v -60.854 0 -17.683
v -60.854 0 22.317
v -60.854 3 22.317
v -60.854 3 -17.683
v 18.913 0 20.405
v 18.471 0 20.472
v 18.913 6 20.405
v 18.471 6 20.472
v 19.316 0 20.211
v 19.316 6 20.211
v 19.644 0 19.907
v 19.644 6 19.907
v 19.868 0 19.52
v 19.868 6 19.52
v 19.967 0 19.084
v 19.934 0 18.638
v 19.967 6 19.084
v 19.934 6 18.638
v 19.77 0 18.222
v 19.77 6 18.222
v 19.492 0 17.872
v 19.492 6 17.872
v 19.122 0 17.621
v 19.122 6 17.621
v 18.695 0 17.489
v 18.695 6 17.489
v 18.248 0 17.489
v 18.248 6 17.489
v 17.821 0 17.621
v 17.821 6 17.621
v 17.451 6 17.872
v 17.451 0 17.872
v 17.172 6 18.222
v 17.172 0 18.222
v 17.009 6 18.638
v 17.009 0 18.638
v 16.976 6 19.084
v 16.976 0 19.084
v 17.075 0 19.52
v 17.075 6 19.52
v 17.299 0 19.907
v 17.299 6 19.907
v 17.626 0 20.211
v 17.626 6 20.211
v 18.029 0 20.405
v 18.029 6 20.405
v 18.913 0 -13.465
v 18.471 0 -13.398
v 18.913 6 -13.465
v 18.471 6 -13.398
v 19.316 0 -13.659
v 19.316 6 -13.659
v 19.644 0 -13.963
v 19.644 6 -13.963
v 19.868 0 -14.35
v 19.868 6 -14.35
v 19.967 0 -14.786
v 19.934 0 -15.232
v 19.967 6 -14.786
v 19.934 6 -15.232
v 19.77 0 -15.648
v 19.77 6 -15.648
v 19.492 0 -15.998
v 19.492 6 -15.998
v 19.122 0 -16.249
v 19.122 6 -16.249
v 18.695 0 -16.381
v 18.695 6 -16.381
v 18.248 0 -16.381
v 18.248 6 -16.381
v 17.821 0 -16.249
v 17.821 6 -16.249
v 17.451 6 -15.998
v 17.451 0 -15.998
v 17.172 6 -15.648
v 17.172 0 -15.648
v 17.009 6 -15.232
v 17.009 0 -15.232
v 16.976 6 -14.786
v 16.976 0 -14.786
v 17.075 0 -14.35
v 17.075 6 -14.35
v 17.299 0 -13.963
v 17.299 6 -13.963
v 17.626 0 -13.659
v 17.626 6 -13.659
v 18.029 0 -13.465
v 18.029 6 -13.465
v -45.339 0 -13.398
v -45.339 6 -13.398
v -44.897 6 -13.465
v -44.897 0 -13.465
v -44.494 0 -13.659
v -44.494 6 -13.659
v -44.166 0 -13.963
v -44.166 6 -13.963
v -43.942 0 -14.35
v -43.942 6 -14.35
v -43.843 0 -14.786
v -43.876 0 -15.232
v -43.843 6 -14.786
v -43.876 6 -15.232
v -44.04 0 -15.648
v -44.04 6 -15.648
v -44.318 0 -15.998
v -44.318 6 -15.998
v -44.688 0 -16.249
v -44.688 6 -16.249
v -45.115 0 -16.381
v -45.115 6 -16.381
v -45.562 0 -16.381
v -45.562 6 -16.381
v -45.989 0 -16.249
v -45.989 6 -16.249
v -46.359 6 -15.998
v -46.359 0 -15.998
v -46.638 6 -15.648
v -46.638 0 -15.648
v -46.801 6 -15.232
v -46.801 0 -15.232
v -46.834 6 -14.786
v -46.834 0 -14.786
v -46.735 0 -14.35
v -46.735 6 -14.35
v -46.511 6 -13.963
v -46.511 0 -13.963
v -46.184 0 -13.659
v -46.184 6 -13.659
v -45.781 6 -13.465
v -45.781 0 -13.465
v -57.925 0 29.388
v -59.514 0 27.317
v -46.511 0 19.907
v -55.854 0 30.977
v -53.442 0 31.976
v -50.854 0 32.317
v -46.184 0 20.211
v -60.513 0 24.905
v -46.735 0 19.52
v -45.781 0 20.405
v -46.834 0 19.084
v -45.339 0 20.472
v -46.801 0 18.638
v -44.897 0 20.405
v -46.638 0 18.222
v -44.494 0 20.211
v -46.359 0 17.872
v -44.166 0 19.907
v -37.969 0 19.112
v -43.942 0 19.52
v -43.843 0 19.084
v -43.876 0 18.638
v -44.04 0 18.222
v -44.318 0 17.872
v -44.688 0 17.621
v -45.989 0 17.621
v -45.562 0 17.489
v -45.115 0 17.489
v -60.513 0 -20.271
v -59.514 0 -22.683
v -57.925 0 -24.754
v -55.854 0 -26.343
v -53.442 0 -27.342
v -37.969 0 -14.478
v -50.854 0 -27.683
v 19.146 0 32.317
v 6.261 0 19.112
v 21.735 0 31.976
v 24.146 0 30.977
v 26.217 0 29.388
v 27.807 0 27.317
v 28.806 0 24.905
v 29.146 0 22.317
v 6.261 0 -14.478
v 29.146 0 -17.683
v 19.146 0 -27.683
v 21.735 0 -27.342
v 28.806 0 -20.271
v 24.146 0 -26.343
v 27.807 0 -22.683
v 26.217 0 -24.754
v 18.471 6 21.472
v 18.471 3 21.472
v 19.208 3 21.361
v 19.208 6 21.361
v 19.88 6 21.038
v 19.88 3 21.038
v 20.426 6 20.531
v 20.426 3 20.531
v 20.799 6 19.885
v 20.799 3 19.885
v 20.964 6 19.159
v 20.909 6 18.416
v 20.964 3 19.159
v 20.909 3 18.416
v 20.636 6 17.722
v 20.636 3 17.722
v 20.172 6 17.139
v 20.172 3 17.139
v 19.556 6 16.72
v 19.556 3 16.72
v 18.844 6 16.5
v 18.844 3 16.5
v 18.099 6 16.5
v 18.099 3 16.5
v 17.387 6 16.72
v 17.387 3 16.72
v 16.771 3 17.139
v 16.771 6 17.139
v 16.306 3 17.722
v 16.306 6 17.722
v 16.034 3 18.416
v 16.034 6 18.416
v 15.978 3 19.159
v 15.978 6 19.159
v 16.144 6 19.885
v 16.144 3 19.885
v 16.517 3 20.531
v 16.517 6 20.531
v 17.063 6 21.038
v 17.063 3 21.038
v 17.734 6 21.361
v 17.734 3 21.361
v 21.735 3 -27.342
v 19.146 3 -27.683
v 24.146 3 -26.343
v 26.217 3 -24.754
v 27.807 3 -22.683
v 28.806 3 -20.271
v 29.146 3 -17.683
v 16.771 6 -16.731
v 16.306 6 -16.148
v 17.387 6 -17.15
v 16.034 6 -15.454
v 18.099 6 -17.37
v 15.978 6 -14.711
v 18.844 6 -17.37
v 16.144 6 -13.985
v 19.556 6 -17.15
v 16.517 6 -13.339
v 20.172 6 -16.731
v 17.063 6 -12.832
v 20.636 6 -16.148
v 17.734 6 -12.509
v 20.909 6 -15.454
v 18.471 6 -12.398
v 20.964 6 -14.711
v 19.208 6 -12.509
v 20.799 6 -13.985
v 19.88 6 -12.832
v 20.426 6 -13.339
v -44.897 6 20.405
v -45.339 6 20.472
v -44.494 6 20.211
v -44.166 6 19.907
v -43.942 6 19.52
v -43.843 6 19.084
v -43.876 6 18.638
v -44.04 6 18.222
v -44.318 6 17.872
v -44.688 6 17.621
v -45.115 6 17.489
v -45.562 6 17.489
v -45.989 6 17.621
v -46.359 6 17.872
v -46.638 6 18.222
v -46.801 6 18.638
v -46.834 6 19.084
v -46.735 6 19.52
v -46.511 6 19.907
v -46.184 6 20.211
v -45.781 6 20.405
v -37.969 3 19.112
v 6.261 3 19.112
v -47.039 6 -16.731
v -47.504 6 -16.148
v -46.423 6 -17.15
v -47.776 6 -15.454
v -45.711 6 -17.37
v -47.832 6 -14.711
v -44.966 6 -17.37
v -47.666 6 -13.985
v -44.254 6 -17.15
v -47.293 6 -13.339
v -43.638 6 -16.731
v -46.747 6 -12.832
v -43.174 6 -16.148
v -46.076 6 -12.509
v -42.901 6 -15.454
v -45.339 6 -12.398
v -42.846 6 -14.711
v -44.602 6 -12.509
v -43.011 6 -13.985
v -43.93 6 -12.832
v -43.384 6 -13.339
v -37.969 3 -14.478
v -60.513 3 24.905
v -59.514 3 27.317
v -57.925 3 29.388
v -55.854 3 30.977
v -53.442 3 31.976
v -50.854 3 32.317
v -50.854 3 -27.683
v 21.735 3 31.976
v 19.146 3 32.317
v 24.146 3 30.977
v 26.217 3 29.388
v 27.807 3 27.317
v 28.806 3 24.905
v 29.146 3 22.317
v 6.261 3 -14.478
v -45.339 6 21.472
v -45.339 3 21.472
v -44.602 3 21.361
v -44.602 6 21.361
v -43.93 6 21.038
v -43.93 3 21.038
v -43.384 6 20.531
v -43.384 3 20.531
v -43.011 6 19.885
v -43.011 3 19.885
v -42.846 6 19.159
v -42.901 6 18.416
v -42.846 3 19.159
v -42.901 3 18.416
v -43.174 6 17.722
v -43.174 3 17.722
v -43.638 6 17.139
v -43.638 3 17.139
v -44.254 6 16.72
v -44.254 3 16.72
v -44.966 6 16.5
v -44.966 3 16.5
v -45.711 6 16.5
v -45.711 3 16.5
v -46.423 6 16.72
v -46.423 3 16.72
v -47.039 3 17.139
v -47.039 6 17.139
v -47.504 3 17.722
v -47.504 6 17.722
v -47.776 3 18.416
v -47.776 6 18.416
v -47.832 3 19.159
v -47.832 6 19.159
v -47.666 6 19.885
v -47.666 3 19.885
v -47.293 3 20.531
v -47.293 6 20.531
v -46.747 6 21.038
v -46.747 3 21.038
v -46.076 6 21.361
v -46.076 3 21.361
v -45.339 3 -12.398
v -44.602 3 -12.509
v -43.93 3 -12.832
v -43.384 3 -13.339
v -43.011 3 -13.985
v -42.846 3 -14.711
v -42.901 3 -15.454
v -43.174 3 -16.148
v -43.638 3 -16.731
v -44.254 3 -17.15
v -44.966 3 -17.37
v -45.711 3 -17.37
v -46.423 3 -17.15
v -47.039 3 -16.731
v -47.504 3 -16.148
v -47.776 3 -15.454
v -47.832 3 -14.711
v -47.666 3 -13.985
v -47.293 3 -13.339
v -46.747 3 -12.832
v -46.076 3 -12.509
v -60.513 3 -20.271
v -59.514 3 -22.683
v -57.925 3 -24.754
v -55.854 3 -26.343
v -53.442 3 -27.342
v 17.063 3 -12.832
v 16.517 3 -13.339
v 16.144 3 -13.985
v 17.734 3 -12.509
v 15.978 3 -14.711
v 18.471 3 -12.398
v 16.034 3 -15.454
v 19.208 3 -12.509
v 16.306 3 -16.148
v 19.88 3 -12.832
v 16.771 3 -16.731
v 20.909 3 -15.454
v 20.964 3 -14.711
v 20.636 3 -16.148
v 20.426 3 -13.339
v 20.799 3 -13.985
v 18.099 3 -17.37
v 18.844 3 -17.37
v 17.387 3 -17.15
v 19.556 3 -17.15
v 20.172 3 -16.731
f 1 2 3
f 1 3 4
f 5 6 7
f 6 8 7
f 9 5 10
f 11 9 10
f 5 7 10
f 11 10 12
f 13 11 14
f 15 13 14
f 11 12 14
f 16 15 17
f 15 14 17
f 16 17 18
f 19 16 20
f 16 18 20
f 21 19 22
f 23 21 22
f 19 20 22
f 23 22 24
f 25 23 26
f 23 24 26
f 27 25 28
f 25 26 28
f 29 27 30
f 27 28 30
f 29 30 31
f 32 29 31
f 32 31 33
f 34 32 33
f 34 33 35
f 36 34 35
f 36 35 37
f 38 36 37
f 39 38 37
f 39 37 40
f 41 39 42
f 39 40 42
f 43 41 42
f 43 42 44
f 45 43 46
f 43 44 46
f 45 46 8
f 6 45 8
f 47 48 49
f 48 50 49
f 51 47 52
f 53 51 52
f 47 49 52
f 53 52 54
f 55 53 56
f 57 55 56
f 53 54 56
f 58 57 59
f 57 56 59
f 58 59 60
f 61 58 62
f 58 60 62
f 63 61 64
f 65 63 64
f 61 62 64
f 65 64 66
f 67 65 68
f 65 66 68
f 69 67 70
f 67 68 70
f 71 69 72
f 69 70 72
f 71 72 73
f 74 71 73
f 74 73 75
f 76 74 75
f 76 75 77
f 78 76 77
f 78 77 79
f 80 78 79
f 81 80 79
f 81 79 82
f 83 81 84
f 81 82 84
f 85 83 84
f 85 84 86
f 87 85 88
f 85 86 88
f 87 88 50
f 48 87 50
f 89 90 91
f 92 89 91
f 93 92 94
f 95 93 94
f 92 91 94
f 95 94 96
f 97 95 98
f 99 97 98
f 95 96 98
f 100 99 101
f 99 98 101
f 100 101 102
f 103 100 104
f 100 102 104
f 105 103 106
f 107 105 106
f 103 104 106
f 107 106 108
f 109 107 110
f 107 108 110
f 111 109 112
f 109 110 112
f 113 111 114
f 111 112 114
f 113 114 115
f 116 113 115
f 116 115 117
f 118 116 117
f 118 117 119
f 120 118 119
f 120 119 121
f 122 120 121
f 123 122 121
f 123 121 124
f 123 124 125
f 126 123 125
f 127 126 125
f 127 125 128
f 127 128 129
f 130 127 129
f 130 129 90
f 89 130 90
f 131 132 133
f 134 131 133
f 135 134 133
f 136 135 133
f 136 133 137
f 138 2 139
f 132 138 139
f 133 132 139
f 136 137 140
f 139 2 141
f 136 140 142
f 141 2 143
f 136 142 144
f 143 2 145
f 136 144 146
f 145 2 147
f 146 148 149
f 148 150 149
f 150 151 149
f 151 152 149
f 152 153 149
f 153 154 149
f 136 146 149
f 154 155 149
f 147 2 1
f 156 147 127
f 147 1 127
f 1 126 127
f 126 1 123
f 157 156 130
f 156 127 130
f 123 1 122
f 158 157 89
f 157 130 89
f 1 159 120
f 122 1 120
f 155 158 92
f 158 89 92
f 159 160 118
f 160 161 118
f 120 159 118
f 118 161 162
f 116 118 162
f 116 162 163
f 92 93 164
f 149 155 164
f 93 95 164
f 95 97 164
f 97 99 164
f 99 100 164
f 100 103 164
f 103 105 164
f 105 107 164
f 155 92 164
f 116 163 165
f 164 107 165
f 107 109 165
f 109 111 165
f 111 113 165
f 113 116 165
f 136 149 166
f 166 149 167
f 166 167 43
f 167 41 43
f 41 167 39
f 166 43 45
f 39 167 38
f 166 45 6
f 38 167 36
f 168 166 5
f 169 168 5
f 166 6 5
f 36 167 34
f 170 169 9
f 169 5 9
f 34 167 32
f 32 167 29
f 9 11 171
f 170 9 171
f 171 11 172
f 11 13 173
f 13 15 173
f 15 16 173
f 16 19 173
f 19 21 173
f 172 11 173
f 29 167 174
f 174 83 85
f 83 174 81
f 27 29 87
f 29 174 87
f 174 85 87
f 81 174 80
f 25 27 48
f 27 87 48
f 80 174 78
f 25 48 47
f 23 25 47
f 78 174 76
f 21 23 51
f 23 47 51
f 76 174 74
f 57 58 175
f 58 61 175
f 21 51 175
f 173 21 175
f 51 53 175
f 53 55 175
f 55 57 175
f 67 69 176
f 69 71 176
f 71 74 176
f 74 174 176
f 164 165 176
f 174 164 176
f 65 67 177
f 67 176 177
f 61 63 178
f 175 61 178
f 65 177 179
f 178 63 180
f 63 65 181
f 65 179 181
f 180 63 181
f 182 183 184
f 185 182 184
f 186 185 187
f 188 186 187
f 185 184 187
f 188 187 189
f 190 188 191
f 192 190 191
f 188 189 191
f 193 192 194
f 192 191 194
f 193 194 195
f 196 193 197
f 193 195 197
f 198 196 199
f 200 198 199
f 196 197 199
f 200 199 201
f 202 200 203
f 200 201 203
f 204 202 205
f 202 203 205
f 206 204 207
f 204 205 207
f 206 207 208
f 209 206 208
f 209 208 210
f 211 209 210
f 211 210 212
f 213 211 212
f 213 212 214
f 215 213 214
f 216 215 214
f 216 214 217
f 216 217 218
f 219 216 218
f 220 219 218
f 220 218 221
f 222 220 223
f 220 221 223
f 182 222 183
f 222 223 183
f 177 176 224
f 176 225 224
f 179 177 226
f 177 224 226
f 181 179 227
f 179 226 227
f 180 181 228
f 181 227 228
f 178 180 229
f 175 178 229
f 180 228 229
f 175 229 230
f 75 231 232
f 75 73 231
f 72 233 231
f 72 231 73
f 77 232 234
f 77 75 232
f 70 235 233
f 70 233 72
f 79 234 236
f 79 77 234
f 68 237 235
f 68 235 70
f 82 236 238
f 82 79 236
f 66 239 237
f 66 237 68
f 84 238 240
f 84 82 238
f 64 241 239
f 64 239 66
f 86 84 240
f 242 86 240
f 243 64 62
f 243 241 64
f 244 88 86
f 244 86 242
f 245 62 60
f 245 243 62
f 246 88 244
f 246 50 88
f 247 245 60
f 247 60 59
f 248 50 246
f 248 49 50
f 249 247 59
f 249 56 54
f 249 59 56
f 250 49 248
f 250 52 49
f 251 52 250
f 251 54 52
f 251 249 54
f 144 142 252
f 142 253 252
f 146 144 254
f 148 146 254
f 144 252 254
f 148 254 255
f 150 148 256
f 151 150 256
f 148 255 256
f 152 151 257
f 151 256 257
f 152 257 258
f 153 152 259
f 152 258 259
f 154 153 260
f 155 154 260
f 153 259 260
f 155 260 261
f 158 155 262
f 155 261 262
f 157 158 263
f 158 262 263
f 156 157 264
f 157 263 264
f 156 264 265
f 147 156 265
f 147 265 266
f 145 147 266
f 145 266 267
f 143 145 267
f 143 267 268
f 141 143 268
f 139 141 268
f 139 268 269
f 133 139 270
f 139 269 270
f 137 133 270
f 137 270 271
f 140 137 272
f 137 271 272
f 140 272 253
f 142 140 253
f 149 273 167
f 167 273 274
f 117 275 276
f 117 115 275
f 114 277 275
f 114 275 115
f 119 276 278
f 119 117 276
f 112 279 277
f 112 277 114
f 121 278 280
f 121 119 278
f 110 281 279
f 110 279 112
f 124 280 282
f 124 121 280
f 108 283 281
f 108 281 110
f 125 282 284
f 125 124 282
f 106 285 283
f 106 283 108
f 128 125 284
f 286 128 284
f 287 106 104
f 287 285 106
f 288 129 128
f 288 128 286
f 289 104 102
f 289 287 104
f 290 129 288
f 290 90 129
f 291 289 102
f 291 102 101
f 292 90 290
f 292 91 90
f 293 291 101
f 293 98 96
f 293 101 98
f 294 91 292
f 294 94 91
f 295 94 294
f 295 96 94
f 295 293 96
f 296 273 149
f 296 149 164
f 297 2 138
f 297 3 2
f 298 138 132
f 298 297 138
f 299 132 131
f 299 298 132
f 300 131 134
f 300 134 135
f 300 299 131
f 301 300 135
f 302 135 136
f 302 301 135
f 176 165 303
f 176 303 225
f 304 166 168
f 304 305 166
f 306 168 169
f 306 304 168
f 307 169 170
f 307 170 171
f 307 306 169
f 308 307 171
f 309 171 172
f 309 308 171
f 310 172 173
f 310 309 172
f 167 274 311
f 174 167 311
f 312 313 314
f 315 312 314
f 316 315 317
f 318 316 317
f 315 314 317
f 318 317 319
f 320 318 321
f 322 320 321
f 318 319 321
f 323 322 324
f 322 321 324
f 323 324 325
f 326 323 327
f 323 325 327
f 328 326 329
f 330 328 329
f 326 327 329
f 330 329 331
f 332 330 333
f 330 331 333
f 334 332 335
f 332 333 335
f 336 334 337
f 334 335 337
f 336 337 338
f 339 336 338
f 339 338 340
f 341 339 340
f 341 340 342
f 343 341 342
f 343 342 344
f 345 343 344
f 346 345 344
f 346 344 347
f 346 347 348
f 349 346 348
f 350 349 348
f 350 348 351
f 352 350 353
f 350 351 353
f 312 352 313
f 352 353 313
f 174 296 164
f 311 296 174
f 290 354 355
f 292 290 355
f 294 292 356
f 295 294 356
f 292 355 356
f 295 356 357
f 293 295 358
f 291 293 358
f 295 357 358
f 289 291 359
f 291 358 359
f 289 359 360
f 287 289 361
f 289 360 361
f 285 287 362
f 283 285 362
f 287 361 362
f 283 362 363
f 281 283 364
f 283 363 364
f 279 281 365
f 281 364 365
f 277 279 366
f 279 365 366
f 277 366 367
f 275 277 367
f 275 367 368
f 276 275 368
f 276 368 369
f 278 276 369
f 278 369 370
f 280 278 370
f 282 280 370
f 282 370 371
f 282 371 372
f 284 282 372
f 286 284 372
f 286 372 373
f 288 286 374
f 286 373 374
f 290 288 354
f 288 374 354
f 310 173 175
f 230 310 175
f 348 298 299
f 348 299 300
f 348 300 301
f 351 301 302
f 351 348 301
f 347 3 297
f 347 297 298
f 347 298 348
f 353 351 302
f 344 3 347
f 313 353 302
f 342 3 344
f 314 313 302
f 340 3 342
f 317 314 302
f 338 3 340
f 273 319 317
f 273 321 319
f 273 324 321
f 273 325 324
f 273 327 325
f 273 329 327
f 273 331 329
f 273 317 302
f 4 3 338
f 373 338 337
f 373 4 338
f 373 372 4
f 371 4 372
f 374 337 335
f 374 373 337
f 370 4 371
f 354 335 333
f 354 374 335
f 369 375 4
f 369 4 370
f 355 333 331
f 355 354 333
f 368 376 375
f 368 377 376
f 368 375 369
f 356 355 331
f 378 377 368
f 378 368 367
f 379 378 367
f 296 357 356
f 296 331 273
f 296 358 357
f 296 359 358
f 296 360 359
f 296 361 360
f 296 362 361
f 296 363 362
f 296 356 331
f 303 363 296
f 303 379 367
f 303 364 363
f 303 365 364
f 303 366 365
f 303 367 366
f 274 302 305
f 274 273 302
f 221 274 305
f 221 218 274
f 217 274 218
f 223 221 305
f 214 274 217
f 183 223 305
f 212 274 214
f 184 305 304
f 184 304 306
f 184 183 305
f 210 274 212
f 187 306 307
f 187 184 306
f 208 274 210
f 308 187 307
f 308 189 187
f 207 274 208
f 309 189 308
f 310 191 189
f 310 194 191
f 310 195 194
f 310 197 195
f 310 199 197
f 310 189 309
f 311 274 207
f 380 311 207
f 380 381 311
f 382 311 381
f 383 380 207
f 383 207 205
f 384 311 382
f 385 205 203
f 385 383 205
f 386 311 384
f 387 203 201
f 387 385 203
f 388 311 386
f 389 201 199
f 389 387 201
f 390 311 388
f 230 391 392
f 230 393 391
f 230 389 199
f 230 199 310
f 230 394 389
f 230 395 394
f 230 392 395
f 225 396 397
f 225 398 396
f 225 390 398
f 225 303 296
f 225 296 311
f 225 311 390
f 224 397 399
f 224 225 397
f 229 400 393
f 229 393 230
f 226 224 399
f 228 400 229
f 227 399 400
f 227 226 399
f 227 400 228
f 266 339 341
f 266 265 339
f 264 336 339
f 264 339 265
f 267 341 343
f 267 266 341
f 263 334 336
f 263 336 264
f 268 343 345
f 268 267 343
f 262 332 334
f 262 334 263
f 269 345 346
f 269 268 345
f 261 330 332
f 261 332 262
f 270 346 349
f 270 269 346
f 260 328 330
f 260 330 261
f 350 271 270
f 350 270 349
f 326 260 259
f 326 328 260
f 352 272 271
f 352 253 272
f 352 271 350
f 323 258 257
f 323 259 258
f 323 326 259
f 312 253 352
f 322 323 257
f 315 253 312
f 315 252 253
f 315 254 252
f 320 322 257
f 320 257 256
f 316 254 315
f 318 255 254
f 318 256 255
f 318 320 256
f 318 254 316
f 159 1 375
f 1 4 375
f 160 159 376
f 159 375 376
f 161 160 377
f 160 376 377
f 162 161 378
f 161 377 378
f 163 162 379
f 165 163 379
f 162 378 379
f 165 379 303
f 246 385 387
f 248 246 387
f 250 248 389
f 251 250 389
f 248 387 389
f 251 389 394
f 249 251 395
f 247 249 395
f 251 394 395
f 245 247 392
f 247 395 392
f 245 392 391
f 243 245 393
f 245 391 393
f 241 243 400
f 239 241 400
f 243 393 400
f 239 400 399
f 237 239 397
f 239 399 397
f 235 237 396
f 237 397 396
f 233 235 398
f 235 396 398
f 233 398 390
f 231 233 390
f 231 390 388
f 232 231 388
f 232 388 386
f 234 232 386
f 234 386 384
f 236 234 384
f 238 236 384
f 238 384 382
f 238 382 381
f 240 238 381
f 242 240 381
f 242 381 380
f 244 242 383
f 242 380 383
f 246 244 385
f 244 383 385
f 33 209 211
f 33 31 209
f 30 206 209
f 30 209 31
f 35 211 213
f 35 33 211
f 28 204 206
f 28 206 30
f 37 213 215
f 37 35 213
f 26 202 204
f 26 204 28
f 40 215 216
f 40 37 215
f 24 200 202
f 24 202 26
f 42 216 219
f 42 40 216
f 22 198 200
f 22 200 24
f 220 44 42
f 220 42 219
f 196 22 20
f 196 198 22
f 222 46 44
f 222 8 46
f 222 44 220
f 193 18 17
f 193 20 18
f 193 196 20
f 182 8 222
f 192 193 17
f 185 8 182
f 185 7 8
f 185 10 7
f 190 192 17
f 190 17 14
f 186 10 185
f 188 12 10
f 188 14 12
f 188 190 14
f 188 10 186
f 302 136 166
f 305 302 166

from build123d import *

# Parameters (mm, degrees)
SKETCH_1_W          = 90
SKETCH_1_H          = 60
EXTRUDE_1_DEPTH     = 3
SKETCH_2_R          = 1.5
SKETCH_2_W          = 44.23
SKETCH_2_H          = 33.59
CUT_EXTRUDE_1_DEPTH = 69.967825655
FILLET_1_R          = 10
SKETCH_3_R          = 2.5
EXTRUDE_2_DEPTH     = 3
SKETCH_4_R          = 1.5
CUT_EXTRUDE_2_DEPTH = 70.163292111


with BuildPart() as part:
    # 草圖1 → 填料-伸長1 (new body)
    with BuildSketch(Plane(origin=(0, 0, 0), x_dir=(1, 0, 0), z_dir=(0, 1, 0))):
        with Locations((-15.853658537, -2.317073171)):
            Rectangle(SKETCH_1_W, SKETCH_1_H)
    extrude(amount=EXTRUDE_1_DEPTH)

    # 草圖2 → 除料-伸長1 (cut, through all)
    with BuildSketch(Plane(origin=(0, 3, 0), x_dir=(1, 0, 0), z_dir=(0, 1, 0))):
        with Locations(Location((-45.338658537, 14.897926829, 0), (0, 0, 270))):
            Circle(SKETCH_2_R)
        with Locations(Location((-45.338658537, -18.972073171, 0), (0, 0, 270))):
            Circle(SKETCH_2_R)
        with Locations(Location((18.471341463, 14.897926829, 0), (0, 0, 270))):
            Circle(SKETCH_2_R)
        with Locations(Location((18.471341463, -18.972073171, 0), (0, 0, 270))):
            Circle(SKETCH_2_R)
        with Locations((-15.853658537, -2.317073171)):
            Rectangle(SKETCH_2_W, SKETCH_2_H)
    extrude(amount=-CUT_EXTRUDE_1_DEPTH, mode=Mode.SUBTRACT)

    # 圓角1
    fillet_1_edges = [part.edges().sort_by_distance(p)[0] for p in [
        (-60.853658537, 1.5, -27.682926829),
        (29.146341463, 1.5, -27.682926829),
        (29.146341463, 1.5, 32.317073171),
        (-60.853658537, 1.5, 32.317073171),
    ]]
    fillet(fillet_1_edges, radius=FILLET_1_R)

    # 草圖3 → 填料-伸長2 (add)
    with BuildSketch(Plane(origin=(0, 3, 0), x_dir=(1, 0, 0), z_dir=(0, 1, 0))):
        with Locations(Location((-45.338658537, 14.897926829, 0), (0, 0, 270))):
            Circle(SKETCH_3_R)
        with Locations(Location((-45.338658537, -18.972073171, 0), (0, 0, 270))):
            Circle(SKETCH_3_R)
        with Locations(Location((18.471341463, -18.972073171, 0), (0, 0, 270))):
            Circle(SKETCH_3_R)
        with Locations(Location((18.471341463, 14.897926829, 0), (0, 0, 270))):
            Circle(SKETCH_3_R)
    extrude(amount=EXTRUDE_2_DEPTH)

    # 草圖4 → 除料-伸長2 (cut, through all)
    with BuildSketch(Plane(origin=(0, 6, 0), x_dir=(1, 0, 0), z_dir=(0, 1, 0))):
        with Locations(Location((-45.338658537, 14.897926829, 0), (0, 0, 270))):
            Circle(SKETCH_4_R)
        with Locations(Location((-45.338658537, -18.972073171, 0), (0, 0, 270))):
            Circle(SKETCH_4_R)
        with Locations(Location((18.471341463, 14.897926829, 0), (0, 0, 270))):
            Circle(SKETCH_4_R)
        with Locations(Location((18.471341463, -18.972073171, 0), (0, 0, 270))):
            Circle(SKETCH_4_R)
    extrude(amount=-CUT_EXTRUDE_2_DEPTH, mode=Mode.SUBTRACT)


solid = part.part
